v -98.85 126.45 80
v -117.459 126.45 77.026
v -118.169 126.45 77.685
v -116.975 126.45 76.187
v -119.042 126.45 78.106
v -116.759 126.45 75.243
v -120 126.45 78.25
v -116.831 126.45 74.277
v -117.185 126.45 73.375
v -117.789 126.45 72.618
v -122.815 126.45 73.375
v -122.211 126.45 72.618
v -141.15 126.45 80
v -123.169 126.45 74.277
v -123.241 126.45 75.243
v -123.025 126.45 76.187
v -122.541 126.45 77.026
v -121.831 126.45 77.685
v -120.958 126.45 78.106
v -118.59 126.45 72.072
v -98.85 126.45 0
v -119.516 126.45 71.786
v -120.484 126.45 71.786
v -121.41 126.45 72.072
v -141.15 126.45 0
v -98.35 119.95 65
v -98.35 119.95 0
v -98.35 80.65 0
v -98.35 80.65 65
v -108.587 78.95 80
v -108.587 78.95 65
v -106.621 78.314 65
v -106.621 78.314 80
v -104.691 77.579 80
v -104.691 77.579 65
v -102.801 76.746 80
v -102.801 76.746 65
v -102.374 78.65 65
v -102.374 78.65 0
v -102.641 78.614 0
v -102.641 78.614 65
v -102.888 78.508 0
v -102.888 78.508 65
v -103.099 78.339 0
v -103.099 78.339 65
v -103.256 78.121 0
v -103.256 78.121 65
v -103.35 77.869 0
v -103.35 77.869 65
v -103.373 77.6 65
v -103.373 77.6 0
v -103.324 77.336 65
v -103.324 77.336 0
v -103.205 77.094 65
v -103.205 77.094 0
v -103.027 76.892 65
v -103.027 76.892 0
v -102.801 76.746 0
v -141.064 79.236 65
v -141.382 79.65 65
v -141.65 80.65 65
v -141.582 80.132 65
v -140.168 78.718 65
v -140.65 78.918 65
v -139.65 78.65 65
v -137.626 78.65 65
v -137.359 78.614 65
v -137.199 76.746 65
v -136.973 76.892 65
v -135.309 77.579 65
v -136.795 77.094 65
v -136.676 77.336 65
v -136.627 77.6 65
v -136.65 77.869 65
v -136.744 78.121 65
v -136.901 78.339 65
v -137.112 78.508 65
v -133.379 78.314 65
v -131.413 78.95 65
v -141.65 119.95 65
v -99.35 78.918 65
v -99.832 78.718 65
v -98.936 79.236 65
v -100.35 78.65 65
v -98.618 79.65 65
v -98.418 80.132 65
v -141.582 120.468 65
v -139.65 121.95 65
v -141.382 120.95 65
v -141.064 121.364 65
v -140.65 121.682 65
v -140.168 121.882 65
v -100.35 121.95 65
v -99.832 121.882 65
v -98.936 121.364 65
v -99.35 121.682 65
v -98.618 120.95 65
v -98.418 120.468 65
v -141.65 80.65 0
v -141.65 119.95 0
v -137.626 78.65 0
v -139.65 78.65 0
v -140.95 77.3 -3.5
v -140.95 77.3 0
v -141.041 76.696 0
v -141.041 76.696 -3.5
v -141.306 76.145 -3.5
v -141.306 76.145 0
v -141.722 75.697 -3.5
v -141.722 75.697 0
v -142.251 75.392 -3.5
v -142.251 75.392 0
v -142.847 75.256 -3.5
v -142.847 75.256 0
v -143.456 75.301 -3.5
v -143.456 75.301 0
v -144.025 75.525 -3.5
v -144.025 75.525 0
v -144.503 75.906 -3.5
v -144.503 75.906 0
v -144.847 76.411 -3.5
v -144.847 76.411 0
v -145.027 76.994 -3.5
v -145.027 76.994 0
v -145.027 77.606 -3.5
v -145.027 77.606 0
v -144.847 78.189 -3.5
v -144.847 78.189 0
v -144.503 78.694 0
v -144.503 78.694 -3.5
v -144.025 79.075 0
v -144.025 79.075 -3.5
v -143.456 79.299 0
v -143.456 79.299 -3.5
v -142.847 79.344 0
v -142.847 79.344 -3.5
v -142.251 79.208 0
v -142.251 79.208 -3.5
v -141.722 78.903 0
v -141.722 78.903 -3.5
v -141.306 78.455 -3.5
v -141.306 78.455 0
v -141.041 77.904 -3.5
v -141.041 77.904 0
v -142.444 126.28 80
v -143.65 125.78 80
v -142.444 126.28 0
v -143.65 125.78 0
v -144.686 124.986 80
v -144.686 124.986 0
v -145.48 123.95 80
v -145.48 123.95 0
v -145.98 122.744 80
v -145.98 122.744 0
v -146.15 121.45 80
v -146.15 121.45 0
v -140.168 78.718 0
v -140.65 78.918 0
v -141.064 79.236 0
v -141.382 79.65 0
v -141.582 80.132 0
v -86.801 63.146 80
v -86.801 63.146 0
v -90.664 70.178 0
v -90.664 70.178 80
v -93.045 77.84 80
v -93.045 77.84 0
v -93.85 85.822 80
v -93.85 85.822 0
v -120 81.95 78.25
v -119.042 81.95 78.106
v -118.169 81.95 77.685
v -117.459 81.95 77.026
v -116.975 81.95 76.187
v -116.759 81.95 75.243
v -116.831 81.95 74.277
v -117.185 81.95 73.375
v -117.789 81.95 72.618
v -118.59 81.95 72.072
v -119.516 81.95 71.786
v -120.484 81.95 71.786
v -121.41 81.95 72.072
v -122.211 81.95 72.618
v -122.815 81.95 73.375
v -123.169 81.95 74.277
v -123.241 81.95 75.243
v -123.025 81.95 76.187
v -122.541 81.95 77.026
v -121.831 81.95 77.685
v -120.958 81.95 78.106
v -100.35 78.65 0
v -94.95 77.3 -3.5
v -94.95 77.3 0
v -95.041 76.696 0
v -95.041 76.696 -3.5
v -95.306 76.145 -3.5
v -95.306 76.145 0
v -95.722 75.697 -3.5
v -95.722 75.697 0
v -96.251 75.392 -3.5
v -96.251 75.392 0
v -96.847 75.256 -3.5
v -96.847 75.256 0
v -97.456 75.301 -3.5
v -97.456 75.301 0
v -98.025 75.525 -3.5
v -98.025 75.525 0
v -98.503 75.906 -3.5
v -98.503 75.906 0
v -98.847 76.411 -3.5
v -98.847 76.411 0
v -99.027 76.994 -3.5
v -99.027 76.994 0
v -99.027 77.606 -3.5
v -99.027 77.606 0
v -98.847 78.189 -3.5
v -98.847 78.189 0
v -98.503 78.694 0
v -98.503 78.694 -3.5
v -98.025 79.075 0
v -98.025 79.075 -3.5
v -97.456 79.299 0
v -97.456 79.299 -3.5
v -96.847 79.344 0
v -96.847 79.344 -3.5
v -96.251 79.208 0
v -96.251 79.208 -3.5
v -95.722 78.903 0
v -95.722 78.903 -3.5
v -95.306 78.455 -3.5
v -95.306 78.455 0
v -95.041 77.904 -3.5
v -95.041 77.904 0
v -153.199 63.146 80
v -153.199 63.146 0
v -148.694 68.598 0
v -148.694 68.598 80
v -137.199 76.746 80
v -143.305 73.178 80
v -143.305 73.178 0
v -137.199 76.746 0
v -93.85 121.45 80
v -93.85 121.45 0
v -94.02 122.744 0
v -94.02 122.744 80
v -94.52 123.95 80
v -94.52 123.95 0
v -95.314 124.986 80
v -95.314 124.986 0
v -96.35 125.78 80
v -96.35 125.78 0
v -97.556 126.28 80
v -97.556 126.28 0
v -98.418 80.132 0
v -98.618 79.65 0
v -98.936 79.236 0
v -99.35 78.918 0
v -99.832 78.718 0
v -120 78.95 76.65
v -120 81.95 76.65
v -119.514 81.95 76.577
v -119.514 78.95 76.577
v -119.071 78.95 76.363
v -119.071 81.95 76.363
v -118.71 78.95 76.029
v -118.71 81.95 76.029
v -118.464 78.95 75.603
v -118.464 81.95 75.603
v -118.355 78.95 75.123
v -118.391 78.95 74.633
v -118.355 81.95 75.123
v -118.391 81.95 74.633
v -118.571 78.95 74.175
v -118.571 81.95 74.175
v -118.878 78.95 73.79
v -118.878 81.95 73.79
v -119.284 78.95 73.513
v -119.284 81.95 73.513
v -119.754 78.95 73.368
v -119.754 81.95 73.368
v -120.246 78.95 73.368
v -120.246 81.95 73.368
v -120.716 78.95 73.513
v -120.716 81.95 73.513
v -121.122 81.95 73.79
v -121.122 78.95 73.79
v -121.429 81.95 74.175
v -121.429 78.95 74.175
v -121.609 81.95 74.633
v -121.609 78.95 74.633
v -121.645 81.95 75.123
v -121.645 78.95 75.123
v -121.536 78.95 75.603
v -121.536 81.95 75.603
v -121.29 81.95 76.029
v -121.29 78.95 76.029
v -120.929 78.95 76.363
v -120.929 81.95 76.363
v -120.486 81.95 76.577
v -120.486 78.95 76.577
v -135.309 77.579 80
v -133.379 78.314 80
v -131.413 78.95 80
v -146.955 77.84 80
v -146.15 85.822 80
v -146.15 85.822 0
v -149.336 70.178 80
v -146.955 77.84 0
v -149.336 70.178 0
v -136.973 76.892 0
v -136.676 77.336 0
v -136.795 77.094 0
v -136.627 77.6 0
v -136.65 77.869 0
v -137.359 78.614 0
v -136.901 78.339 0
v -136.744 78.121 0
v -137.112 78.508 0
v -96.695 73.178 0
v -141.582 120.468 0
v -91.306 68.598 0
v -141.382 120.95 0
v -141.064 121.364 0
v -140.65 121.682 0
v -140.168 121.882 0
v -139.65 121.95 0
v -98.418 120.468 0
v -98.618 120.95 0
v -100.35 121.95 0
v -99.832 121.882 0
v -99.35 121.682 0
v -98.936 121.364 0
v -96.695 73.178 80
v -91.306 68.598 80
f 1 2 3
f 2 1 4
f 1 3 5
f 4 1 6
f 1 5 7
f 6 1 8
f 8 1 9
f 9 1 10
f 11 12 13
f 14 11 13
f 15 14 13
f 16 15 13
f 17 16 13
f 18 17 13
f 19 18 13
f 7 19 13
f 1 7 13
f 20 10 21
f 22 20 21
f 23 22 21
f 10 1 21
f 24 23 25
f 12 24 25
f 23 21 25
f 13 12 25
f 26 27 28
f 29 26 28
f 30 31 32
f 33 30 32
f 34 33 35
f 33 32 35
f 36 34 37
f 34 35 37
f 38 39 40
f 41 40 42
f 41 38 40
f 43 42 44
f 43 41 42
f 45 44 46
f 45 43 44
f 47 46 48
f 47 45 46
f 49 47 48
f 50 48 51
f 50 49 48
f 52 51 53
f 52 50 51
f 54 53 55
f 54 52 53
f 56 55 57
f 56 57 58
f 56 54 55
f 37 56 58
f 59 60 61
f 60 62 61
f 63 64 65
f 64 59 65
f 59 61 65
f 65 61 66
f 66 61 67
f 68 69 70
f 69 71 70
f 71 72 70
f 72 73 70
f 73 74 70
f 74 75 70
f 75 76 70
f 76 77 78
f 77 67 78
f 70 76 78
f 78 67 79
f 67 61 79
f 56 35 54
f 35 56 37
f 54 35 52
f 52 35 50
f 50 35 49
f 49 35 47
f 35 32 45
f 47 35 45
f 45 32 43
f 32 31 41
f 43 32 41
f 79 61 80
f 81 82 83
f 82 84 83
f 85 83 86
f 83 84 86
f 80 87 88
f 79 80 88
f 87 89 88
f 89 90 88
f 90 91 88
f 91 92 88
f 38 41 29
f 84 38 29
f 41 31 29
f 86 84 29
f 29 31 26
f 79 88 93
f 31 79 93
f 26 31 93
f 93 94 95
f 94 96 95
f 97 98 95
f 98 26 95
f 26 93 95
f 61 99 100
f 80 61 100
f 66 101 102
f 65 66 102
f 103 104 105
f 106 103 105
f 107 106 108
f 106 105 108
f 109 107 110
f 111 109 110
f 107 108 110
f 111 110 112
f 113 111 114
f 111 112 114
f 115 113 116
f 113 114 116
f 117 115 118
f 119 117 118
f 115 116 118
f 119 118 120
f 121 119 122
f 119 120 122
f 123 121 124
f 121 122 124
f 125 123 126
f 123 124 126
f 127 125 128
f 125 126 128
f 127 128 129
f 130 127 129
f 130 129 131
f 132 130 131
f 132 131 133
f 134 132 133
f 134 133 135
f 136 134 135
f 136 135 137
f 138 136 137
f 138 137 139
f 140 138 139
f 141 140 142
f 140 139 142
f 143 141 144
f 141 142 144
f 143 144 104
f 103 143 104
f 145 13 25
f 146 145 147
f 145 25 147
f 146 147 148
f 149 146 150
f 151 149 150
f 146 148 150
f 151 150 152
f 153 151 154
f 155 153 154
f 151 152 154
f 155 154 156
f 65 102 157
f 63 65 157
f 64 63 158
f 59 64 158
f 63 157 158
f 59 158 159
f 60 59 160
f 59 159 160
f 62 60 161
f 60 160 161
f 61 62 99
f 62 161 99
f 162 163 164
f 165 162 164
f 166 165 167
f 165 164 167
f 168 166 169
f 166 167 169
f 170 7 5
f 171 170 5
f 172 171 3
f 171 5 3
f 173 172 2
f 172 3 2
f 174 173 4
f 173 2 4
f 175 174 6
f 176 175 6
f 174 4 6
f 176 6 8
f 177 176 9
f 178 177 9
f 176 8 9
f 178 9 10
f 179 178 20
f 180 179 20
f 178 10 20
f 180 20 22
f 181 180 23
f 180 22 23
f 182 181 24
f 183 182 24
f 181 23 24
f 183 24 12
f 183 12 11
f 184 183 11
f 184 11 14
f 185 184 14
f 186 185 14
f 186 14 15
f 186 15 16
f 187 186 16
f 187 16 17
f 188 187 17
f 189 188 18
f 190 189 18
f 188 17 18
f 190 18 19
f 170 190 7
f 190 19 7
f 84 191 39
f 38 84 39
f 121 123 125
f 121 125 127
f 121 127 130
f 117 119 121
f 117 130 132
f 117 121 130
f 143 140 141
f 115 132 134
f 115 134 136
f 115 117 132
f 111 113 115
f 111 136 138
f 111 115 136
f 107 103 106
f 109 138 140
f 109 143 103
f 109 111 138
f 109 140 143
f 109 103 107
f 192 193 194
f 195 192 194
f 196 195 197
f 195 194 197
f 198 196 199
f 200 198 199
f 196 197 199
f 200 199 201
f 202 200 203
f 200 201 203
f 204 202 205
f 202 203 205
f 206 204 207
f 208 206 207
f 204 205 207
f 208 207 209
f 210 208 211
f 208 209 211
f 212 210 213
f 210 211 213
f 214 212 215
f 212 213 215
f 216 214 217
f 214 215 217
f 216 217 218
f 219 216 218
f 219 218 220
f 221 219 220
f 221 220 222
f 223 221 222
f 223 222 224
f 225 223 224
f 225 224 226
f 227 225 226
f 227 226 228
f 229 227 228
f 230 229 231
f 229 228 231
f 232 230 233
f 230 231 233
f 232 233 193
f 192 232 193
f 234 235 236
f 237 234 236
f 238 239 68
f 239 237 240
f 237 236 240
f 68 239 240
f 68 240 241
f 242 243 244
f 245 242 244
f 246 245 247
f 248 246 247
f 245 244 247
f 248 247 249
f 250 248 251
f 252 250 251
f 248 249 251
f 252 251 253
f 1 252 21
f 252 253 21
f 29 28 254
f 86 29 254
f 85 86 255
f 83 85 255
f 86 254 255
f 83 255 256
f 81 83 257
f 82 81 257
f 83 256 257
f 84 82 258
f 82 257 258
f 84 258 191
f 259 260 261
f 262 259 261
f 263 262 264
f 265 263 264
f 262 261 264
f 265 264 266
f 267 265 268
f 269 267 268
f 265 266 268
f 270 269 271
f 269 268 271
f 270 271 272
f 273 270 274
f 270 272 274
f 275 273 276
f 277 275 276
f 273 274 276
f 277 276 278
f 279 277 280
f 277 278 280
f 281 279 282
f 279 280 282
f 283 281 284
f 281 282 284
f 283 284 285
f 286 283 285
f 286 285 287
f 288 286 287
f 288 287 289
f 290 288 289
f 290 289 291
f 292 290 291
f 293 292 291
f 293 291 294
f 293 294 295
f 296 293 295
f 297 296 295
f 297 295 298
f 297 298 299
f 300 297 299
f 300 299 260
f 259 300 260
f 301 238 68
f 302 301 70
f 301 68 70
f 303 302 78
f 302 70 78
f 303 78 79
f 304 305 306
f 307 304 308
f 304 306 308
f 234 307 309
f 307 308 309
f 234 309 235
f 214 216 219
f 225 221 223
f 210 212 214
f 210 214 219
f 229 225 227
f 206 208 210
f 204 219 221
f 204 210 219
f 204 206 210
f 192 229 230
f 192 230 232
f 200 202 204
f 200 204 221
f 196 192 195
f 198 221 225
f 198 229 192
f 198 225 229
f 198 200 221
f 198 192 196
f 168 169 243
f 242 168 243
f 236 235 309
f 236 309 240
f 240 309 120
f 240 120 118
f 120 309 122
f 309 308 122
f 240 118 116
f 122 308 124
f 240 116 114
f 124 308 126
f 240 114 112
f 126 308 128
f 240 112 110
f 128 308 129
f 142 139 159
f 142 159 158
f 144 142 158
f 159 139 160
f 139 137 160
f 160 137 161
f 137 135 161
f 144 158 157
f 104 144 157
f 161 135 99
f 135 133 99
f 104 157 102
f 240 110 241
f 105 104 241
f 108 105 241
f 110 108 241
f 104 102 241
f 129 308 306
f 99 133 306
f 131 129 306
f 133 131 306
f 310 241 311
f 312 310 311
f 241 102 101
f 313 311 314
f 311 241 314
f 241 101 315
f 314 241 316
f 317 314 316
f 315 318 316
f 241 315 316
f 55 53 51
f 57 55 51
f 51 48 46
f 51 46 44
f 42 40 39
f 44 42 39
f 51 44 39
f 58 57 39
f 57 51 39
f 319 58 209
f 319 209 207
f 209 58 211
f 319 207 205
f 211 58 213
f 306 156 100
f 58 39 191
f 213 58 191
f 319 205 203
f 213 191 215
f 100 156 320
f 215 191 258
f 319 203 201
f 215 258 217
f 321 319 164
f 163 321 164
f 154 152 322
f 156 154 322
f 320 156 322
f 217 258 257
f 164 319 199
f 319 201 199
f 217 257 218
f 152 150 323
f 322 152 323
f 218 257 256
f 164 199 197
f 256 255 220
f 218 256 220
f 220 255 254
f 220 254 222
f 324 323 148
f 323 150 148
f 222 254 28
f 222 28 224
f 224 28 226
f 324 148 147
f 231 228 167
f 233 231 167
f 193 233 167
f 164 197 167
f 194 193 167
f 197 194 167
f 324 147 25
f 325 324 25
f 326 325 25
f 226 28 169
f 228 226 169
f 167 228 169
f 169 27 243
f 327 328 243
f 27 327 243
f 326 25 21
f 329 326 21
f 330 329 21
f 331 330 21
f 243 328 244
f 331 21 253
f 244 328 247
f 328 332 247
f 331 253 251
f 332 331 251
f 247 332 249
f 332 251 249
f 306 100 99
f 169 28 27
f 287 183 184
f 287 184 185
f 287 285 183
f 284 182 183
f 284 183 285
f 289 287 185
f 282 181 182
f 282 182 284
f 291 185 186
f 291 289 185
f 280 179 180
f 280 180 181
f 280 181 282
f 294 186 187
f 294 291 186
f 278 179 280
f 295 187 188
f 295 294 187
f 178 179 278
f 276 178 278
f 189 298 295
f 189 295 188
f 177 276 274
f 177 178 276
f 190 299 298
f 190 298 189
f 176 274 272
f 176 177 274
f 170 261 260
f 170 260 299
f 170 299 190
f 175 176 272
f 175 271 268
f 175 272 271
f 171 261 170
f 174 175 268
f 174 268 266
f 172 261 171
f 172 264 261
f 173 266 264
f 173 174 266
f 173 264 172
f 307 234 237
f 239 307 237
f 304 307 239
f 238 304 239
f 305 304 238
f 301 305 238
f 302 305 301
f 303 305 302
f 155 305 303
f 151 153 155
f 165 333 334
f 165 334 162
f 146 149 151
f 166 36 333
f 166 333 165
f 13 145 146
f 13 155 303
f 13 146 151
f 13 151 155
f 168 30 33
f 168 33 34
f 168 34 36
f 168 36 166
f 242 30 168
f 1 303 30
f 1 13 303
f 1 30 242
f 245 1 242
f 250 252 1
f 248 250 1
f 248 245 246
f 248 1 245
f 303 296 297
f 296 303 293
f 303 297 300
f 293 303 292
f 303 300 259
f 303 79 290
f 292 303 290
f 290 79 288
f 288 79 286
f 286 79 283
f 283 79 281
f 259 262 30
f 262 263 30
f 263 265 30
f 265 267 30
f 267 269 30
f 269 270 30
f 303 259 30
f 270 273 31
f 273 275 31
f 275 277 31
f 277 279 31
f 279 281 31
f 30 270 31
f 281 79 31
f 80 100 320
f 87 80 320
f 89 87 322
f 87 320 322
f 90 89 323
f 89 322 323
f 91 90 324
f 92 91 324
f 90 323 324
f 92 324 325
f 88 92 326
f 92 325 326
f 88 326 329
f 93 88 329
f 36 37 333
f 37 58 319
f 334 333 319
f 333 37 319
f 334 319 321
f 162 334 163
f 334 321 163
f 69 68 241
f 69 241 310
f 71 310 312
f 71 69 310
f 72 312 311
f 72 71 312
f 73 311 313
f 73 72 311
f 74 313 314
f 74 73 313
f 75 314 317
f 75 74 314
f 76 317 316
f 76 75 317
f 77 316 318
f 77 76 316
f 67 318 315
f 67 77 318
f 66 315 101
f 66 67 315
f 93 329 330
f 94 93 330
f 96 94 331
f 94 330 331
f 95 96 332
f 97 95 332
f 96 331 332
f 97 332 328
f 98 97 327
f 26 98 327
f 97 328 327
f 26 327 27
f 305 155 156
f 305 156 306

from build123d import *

# Parameters (mm, degrees)
BOSS_EXTRUDE1_DEPTH = 80
FILLET1_R           = 1
SKETCH4_R           = 2.05
BOSS_EXTRUDE2_DEPTH = 3.5
BOSS_EXTRUDE3_START = -15
BOSS_EXTRUDE3_DEPTH = 15
SKETCH6_R           = 3.25
CUT_EXTRUDE1_DEPTH  = 44.5
SKETCH8_R           = 1.65
CUT_EXTRUDE2_DEPTH  = 179.465826414


with BuildPart() as part:
    # Sketch1 → Boss-Extrude1 (new body)
    with BuildSketch(Plane.XY):
        with BuildLine():
            Line((-141.65, 83.343364131), (-141.65, 117.256635869))
            Line((-141.65, 117.256635869), (-141.65, 119.95))
            ThreePointArc((-141.65, 119.95), (-141.064213562, 121.364213562), (-139.65, 121.95))
            Line((-139.65, 121.95), (-136.956635869, 121.95))
            Line((-136.956635869, 121.95), (-103.043364131, 121.95))
            Line((-103.043364131, 121.95), (-100.35, 121.95))
            ThreePointArc((-100.35, 121.95), (-98.935786438, 121.364213562), (-98.35, 119.95))
            Line((-98.35, 119.95), (-98.35, 117.256635869))
            Line((-98.35, 117.256635869), (-98.35, 83.343364131))
            Line((-98.35, 83.343364131), (-98.35, 80.65))
            ThreePointArc((-98.35, 80.65), (-98.935786438, 79.235786438), (-100.35, 78.65))
            Line((-100.35, 78.65), (-103.043364131, 78.65))
            Line((-103.043364131, 78.65), (-107.615836726, 78.65))
            ThreePointArc((-107.615836726, 78.65), (-95.926385052, 72.619515209), (-86.80143213, 63.146117643))
            ThreePointArc((-86.80143213, 63.146117643), (-92.047233442, 73.949028976), (-93.85, 85.822164931))
            Line((-93.85, 85.822164931), (-93.85, 121.45))
            ThreePointArc((-93.85, 121.45), (-95.314466094, 124.985533906), (-98.85, 126.45))
            Line((-98.85, 126.45), (-141.15, 126.45))
            ThreePointArc((-141.15, 126.45), (-144.685533906, 124.985533906), (-146.15, 121.45))
            Line((-146.15, 121.45), (-146.15, 85.822164931))
            ThreePointArc((-146.15, 85.822164931), (-147.952766558, 73.949028976), (-153.19856787, 63.146117643))
            ThreePointArc((-153.19856787, 63.146117643), (-144.073614948, 72.619515209), (-132.384163274, 78.65))
            Line((-132.384163274, 78.65), (-136.956635869, 78.65))
            Line((-136.956635869, 78.65), (-139.65, 78.65))
            ThreePointArc((-139.65, 78.65), (-141.064213562, 79.235786438), (-141.65, 80.65))
            Line((-141.65, 80.65), (-141.65, 83.343364131))
        make_face()
    extrude(amount=BOSS_EXTRUDE1_DEPTH)

    # Fillet1
    fillet1_edges = [part.edges().sort_by_distance(p)[0] for p in [
        (-107.615836726, 78.65, 40),
        (-132.384163274, 78.65, 40),
    ]]
    fillet(fillet1_edges, radius=FILLET1_R)

    # Sketch4 → Boss-Extrude2 (add)
    with BuildSketch(Plane(origin=(0, 0, 0), x_dir=(-1, 0, 0), z_dir=(0, 0, -1))):
        with Locations(Location((143, 77.3, 0), (0, 0, 180))):
            Circle(SKETCH4_R)
        with Locations(Location((97, 77.3, 0), (0, 0, 180))):
            Circle(SKETCH4_R)
    extrude(amount=BOSS_EXTRUDE2_DEPTH)

    # Sketch5 → Boss-Extrude3 (add)
    with BuildSketch(Plane.XY.offset(80).offset(BOSS_EXTRUDE3_START)):
        with BuildLine():
            Line((-93.85, 85.822164931), (-93.85, 121.45))
            ThreePointArc((-93.85, 121.45), (-95.314466094, 124.985533906), (-98.85, 126.45))
            Line((-98.85, 126.45), (-141.15, 126.45))
            ThreePointArc((-141.15, 126.45), (-144.685533906, 124.985533906), (-146.15, 121.45))
            Line((-146.15, 121.45), (-146.15, 85.822164931))
            ThreePointArc((-146.15, 85.822164931), (-147.952766558, 73.949028976), (-153.19856787, 63.146117643))
            ThreePointArc((-153.19856787, 63.146117643), (-143.664305463, 72.920402311), (-131.413478874, 78.95))
            Line((-131.413478874, 78.95), (-108.586521126, 78.95))
            ThreePointArc((-108.586521126, 78.95), (-96.335694537, 72.920402311), (-86.80143213, 63.146117643))
            ThreePointArc((-86.80143213, 63.146117643), (-92.047233442, 73.949028976), (-93.85, 85.822164931))
        make_face()
    extrude(amount=BOSS_EXTRUDE3_DEPTH)

    # Sketch6 → Cut-Extrude1 (cut)
    with BuildSketch(Plane(origin=(0, 126.45, 0), x_dir=(1, 0, 0), z_dir=(0, 1, 0))):
        with Locations(Location((-120, -75, 0), (0, 0, 270))):
            Circle(SKETCH6_R)
    extrude(amount=-CUT_EXTRUDE1_DEPTH, mode=Mode.SUBTRACT)

    # Sketch8 → Cut-Extrude2 (cut, through all)
    with BuildSketch(Plane(origin=(0, 81.95, 0), x_dir=(1, 0, 0), z_dir=(0, 1, 0))):
        with Locations(Location((-120, -75, 0), (0, 0, 270))):
            Circle(SKETCH8_R)
    extrude(amount=-CUT_EXTRUDE2_DEPTH, mode=Mode.SUBTRACT)


solid = part.part
